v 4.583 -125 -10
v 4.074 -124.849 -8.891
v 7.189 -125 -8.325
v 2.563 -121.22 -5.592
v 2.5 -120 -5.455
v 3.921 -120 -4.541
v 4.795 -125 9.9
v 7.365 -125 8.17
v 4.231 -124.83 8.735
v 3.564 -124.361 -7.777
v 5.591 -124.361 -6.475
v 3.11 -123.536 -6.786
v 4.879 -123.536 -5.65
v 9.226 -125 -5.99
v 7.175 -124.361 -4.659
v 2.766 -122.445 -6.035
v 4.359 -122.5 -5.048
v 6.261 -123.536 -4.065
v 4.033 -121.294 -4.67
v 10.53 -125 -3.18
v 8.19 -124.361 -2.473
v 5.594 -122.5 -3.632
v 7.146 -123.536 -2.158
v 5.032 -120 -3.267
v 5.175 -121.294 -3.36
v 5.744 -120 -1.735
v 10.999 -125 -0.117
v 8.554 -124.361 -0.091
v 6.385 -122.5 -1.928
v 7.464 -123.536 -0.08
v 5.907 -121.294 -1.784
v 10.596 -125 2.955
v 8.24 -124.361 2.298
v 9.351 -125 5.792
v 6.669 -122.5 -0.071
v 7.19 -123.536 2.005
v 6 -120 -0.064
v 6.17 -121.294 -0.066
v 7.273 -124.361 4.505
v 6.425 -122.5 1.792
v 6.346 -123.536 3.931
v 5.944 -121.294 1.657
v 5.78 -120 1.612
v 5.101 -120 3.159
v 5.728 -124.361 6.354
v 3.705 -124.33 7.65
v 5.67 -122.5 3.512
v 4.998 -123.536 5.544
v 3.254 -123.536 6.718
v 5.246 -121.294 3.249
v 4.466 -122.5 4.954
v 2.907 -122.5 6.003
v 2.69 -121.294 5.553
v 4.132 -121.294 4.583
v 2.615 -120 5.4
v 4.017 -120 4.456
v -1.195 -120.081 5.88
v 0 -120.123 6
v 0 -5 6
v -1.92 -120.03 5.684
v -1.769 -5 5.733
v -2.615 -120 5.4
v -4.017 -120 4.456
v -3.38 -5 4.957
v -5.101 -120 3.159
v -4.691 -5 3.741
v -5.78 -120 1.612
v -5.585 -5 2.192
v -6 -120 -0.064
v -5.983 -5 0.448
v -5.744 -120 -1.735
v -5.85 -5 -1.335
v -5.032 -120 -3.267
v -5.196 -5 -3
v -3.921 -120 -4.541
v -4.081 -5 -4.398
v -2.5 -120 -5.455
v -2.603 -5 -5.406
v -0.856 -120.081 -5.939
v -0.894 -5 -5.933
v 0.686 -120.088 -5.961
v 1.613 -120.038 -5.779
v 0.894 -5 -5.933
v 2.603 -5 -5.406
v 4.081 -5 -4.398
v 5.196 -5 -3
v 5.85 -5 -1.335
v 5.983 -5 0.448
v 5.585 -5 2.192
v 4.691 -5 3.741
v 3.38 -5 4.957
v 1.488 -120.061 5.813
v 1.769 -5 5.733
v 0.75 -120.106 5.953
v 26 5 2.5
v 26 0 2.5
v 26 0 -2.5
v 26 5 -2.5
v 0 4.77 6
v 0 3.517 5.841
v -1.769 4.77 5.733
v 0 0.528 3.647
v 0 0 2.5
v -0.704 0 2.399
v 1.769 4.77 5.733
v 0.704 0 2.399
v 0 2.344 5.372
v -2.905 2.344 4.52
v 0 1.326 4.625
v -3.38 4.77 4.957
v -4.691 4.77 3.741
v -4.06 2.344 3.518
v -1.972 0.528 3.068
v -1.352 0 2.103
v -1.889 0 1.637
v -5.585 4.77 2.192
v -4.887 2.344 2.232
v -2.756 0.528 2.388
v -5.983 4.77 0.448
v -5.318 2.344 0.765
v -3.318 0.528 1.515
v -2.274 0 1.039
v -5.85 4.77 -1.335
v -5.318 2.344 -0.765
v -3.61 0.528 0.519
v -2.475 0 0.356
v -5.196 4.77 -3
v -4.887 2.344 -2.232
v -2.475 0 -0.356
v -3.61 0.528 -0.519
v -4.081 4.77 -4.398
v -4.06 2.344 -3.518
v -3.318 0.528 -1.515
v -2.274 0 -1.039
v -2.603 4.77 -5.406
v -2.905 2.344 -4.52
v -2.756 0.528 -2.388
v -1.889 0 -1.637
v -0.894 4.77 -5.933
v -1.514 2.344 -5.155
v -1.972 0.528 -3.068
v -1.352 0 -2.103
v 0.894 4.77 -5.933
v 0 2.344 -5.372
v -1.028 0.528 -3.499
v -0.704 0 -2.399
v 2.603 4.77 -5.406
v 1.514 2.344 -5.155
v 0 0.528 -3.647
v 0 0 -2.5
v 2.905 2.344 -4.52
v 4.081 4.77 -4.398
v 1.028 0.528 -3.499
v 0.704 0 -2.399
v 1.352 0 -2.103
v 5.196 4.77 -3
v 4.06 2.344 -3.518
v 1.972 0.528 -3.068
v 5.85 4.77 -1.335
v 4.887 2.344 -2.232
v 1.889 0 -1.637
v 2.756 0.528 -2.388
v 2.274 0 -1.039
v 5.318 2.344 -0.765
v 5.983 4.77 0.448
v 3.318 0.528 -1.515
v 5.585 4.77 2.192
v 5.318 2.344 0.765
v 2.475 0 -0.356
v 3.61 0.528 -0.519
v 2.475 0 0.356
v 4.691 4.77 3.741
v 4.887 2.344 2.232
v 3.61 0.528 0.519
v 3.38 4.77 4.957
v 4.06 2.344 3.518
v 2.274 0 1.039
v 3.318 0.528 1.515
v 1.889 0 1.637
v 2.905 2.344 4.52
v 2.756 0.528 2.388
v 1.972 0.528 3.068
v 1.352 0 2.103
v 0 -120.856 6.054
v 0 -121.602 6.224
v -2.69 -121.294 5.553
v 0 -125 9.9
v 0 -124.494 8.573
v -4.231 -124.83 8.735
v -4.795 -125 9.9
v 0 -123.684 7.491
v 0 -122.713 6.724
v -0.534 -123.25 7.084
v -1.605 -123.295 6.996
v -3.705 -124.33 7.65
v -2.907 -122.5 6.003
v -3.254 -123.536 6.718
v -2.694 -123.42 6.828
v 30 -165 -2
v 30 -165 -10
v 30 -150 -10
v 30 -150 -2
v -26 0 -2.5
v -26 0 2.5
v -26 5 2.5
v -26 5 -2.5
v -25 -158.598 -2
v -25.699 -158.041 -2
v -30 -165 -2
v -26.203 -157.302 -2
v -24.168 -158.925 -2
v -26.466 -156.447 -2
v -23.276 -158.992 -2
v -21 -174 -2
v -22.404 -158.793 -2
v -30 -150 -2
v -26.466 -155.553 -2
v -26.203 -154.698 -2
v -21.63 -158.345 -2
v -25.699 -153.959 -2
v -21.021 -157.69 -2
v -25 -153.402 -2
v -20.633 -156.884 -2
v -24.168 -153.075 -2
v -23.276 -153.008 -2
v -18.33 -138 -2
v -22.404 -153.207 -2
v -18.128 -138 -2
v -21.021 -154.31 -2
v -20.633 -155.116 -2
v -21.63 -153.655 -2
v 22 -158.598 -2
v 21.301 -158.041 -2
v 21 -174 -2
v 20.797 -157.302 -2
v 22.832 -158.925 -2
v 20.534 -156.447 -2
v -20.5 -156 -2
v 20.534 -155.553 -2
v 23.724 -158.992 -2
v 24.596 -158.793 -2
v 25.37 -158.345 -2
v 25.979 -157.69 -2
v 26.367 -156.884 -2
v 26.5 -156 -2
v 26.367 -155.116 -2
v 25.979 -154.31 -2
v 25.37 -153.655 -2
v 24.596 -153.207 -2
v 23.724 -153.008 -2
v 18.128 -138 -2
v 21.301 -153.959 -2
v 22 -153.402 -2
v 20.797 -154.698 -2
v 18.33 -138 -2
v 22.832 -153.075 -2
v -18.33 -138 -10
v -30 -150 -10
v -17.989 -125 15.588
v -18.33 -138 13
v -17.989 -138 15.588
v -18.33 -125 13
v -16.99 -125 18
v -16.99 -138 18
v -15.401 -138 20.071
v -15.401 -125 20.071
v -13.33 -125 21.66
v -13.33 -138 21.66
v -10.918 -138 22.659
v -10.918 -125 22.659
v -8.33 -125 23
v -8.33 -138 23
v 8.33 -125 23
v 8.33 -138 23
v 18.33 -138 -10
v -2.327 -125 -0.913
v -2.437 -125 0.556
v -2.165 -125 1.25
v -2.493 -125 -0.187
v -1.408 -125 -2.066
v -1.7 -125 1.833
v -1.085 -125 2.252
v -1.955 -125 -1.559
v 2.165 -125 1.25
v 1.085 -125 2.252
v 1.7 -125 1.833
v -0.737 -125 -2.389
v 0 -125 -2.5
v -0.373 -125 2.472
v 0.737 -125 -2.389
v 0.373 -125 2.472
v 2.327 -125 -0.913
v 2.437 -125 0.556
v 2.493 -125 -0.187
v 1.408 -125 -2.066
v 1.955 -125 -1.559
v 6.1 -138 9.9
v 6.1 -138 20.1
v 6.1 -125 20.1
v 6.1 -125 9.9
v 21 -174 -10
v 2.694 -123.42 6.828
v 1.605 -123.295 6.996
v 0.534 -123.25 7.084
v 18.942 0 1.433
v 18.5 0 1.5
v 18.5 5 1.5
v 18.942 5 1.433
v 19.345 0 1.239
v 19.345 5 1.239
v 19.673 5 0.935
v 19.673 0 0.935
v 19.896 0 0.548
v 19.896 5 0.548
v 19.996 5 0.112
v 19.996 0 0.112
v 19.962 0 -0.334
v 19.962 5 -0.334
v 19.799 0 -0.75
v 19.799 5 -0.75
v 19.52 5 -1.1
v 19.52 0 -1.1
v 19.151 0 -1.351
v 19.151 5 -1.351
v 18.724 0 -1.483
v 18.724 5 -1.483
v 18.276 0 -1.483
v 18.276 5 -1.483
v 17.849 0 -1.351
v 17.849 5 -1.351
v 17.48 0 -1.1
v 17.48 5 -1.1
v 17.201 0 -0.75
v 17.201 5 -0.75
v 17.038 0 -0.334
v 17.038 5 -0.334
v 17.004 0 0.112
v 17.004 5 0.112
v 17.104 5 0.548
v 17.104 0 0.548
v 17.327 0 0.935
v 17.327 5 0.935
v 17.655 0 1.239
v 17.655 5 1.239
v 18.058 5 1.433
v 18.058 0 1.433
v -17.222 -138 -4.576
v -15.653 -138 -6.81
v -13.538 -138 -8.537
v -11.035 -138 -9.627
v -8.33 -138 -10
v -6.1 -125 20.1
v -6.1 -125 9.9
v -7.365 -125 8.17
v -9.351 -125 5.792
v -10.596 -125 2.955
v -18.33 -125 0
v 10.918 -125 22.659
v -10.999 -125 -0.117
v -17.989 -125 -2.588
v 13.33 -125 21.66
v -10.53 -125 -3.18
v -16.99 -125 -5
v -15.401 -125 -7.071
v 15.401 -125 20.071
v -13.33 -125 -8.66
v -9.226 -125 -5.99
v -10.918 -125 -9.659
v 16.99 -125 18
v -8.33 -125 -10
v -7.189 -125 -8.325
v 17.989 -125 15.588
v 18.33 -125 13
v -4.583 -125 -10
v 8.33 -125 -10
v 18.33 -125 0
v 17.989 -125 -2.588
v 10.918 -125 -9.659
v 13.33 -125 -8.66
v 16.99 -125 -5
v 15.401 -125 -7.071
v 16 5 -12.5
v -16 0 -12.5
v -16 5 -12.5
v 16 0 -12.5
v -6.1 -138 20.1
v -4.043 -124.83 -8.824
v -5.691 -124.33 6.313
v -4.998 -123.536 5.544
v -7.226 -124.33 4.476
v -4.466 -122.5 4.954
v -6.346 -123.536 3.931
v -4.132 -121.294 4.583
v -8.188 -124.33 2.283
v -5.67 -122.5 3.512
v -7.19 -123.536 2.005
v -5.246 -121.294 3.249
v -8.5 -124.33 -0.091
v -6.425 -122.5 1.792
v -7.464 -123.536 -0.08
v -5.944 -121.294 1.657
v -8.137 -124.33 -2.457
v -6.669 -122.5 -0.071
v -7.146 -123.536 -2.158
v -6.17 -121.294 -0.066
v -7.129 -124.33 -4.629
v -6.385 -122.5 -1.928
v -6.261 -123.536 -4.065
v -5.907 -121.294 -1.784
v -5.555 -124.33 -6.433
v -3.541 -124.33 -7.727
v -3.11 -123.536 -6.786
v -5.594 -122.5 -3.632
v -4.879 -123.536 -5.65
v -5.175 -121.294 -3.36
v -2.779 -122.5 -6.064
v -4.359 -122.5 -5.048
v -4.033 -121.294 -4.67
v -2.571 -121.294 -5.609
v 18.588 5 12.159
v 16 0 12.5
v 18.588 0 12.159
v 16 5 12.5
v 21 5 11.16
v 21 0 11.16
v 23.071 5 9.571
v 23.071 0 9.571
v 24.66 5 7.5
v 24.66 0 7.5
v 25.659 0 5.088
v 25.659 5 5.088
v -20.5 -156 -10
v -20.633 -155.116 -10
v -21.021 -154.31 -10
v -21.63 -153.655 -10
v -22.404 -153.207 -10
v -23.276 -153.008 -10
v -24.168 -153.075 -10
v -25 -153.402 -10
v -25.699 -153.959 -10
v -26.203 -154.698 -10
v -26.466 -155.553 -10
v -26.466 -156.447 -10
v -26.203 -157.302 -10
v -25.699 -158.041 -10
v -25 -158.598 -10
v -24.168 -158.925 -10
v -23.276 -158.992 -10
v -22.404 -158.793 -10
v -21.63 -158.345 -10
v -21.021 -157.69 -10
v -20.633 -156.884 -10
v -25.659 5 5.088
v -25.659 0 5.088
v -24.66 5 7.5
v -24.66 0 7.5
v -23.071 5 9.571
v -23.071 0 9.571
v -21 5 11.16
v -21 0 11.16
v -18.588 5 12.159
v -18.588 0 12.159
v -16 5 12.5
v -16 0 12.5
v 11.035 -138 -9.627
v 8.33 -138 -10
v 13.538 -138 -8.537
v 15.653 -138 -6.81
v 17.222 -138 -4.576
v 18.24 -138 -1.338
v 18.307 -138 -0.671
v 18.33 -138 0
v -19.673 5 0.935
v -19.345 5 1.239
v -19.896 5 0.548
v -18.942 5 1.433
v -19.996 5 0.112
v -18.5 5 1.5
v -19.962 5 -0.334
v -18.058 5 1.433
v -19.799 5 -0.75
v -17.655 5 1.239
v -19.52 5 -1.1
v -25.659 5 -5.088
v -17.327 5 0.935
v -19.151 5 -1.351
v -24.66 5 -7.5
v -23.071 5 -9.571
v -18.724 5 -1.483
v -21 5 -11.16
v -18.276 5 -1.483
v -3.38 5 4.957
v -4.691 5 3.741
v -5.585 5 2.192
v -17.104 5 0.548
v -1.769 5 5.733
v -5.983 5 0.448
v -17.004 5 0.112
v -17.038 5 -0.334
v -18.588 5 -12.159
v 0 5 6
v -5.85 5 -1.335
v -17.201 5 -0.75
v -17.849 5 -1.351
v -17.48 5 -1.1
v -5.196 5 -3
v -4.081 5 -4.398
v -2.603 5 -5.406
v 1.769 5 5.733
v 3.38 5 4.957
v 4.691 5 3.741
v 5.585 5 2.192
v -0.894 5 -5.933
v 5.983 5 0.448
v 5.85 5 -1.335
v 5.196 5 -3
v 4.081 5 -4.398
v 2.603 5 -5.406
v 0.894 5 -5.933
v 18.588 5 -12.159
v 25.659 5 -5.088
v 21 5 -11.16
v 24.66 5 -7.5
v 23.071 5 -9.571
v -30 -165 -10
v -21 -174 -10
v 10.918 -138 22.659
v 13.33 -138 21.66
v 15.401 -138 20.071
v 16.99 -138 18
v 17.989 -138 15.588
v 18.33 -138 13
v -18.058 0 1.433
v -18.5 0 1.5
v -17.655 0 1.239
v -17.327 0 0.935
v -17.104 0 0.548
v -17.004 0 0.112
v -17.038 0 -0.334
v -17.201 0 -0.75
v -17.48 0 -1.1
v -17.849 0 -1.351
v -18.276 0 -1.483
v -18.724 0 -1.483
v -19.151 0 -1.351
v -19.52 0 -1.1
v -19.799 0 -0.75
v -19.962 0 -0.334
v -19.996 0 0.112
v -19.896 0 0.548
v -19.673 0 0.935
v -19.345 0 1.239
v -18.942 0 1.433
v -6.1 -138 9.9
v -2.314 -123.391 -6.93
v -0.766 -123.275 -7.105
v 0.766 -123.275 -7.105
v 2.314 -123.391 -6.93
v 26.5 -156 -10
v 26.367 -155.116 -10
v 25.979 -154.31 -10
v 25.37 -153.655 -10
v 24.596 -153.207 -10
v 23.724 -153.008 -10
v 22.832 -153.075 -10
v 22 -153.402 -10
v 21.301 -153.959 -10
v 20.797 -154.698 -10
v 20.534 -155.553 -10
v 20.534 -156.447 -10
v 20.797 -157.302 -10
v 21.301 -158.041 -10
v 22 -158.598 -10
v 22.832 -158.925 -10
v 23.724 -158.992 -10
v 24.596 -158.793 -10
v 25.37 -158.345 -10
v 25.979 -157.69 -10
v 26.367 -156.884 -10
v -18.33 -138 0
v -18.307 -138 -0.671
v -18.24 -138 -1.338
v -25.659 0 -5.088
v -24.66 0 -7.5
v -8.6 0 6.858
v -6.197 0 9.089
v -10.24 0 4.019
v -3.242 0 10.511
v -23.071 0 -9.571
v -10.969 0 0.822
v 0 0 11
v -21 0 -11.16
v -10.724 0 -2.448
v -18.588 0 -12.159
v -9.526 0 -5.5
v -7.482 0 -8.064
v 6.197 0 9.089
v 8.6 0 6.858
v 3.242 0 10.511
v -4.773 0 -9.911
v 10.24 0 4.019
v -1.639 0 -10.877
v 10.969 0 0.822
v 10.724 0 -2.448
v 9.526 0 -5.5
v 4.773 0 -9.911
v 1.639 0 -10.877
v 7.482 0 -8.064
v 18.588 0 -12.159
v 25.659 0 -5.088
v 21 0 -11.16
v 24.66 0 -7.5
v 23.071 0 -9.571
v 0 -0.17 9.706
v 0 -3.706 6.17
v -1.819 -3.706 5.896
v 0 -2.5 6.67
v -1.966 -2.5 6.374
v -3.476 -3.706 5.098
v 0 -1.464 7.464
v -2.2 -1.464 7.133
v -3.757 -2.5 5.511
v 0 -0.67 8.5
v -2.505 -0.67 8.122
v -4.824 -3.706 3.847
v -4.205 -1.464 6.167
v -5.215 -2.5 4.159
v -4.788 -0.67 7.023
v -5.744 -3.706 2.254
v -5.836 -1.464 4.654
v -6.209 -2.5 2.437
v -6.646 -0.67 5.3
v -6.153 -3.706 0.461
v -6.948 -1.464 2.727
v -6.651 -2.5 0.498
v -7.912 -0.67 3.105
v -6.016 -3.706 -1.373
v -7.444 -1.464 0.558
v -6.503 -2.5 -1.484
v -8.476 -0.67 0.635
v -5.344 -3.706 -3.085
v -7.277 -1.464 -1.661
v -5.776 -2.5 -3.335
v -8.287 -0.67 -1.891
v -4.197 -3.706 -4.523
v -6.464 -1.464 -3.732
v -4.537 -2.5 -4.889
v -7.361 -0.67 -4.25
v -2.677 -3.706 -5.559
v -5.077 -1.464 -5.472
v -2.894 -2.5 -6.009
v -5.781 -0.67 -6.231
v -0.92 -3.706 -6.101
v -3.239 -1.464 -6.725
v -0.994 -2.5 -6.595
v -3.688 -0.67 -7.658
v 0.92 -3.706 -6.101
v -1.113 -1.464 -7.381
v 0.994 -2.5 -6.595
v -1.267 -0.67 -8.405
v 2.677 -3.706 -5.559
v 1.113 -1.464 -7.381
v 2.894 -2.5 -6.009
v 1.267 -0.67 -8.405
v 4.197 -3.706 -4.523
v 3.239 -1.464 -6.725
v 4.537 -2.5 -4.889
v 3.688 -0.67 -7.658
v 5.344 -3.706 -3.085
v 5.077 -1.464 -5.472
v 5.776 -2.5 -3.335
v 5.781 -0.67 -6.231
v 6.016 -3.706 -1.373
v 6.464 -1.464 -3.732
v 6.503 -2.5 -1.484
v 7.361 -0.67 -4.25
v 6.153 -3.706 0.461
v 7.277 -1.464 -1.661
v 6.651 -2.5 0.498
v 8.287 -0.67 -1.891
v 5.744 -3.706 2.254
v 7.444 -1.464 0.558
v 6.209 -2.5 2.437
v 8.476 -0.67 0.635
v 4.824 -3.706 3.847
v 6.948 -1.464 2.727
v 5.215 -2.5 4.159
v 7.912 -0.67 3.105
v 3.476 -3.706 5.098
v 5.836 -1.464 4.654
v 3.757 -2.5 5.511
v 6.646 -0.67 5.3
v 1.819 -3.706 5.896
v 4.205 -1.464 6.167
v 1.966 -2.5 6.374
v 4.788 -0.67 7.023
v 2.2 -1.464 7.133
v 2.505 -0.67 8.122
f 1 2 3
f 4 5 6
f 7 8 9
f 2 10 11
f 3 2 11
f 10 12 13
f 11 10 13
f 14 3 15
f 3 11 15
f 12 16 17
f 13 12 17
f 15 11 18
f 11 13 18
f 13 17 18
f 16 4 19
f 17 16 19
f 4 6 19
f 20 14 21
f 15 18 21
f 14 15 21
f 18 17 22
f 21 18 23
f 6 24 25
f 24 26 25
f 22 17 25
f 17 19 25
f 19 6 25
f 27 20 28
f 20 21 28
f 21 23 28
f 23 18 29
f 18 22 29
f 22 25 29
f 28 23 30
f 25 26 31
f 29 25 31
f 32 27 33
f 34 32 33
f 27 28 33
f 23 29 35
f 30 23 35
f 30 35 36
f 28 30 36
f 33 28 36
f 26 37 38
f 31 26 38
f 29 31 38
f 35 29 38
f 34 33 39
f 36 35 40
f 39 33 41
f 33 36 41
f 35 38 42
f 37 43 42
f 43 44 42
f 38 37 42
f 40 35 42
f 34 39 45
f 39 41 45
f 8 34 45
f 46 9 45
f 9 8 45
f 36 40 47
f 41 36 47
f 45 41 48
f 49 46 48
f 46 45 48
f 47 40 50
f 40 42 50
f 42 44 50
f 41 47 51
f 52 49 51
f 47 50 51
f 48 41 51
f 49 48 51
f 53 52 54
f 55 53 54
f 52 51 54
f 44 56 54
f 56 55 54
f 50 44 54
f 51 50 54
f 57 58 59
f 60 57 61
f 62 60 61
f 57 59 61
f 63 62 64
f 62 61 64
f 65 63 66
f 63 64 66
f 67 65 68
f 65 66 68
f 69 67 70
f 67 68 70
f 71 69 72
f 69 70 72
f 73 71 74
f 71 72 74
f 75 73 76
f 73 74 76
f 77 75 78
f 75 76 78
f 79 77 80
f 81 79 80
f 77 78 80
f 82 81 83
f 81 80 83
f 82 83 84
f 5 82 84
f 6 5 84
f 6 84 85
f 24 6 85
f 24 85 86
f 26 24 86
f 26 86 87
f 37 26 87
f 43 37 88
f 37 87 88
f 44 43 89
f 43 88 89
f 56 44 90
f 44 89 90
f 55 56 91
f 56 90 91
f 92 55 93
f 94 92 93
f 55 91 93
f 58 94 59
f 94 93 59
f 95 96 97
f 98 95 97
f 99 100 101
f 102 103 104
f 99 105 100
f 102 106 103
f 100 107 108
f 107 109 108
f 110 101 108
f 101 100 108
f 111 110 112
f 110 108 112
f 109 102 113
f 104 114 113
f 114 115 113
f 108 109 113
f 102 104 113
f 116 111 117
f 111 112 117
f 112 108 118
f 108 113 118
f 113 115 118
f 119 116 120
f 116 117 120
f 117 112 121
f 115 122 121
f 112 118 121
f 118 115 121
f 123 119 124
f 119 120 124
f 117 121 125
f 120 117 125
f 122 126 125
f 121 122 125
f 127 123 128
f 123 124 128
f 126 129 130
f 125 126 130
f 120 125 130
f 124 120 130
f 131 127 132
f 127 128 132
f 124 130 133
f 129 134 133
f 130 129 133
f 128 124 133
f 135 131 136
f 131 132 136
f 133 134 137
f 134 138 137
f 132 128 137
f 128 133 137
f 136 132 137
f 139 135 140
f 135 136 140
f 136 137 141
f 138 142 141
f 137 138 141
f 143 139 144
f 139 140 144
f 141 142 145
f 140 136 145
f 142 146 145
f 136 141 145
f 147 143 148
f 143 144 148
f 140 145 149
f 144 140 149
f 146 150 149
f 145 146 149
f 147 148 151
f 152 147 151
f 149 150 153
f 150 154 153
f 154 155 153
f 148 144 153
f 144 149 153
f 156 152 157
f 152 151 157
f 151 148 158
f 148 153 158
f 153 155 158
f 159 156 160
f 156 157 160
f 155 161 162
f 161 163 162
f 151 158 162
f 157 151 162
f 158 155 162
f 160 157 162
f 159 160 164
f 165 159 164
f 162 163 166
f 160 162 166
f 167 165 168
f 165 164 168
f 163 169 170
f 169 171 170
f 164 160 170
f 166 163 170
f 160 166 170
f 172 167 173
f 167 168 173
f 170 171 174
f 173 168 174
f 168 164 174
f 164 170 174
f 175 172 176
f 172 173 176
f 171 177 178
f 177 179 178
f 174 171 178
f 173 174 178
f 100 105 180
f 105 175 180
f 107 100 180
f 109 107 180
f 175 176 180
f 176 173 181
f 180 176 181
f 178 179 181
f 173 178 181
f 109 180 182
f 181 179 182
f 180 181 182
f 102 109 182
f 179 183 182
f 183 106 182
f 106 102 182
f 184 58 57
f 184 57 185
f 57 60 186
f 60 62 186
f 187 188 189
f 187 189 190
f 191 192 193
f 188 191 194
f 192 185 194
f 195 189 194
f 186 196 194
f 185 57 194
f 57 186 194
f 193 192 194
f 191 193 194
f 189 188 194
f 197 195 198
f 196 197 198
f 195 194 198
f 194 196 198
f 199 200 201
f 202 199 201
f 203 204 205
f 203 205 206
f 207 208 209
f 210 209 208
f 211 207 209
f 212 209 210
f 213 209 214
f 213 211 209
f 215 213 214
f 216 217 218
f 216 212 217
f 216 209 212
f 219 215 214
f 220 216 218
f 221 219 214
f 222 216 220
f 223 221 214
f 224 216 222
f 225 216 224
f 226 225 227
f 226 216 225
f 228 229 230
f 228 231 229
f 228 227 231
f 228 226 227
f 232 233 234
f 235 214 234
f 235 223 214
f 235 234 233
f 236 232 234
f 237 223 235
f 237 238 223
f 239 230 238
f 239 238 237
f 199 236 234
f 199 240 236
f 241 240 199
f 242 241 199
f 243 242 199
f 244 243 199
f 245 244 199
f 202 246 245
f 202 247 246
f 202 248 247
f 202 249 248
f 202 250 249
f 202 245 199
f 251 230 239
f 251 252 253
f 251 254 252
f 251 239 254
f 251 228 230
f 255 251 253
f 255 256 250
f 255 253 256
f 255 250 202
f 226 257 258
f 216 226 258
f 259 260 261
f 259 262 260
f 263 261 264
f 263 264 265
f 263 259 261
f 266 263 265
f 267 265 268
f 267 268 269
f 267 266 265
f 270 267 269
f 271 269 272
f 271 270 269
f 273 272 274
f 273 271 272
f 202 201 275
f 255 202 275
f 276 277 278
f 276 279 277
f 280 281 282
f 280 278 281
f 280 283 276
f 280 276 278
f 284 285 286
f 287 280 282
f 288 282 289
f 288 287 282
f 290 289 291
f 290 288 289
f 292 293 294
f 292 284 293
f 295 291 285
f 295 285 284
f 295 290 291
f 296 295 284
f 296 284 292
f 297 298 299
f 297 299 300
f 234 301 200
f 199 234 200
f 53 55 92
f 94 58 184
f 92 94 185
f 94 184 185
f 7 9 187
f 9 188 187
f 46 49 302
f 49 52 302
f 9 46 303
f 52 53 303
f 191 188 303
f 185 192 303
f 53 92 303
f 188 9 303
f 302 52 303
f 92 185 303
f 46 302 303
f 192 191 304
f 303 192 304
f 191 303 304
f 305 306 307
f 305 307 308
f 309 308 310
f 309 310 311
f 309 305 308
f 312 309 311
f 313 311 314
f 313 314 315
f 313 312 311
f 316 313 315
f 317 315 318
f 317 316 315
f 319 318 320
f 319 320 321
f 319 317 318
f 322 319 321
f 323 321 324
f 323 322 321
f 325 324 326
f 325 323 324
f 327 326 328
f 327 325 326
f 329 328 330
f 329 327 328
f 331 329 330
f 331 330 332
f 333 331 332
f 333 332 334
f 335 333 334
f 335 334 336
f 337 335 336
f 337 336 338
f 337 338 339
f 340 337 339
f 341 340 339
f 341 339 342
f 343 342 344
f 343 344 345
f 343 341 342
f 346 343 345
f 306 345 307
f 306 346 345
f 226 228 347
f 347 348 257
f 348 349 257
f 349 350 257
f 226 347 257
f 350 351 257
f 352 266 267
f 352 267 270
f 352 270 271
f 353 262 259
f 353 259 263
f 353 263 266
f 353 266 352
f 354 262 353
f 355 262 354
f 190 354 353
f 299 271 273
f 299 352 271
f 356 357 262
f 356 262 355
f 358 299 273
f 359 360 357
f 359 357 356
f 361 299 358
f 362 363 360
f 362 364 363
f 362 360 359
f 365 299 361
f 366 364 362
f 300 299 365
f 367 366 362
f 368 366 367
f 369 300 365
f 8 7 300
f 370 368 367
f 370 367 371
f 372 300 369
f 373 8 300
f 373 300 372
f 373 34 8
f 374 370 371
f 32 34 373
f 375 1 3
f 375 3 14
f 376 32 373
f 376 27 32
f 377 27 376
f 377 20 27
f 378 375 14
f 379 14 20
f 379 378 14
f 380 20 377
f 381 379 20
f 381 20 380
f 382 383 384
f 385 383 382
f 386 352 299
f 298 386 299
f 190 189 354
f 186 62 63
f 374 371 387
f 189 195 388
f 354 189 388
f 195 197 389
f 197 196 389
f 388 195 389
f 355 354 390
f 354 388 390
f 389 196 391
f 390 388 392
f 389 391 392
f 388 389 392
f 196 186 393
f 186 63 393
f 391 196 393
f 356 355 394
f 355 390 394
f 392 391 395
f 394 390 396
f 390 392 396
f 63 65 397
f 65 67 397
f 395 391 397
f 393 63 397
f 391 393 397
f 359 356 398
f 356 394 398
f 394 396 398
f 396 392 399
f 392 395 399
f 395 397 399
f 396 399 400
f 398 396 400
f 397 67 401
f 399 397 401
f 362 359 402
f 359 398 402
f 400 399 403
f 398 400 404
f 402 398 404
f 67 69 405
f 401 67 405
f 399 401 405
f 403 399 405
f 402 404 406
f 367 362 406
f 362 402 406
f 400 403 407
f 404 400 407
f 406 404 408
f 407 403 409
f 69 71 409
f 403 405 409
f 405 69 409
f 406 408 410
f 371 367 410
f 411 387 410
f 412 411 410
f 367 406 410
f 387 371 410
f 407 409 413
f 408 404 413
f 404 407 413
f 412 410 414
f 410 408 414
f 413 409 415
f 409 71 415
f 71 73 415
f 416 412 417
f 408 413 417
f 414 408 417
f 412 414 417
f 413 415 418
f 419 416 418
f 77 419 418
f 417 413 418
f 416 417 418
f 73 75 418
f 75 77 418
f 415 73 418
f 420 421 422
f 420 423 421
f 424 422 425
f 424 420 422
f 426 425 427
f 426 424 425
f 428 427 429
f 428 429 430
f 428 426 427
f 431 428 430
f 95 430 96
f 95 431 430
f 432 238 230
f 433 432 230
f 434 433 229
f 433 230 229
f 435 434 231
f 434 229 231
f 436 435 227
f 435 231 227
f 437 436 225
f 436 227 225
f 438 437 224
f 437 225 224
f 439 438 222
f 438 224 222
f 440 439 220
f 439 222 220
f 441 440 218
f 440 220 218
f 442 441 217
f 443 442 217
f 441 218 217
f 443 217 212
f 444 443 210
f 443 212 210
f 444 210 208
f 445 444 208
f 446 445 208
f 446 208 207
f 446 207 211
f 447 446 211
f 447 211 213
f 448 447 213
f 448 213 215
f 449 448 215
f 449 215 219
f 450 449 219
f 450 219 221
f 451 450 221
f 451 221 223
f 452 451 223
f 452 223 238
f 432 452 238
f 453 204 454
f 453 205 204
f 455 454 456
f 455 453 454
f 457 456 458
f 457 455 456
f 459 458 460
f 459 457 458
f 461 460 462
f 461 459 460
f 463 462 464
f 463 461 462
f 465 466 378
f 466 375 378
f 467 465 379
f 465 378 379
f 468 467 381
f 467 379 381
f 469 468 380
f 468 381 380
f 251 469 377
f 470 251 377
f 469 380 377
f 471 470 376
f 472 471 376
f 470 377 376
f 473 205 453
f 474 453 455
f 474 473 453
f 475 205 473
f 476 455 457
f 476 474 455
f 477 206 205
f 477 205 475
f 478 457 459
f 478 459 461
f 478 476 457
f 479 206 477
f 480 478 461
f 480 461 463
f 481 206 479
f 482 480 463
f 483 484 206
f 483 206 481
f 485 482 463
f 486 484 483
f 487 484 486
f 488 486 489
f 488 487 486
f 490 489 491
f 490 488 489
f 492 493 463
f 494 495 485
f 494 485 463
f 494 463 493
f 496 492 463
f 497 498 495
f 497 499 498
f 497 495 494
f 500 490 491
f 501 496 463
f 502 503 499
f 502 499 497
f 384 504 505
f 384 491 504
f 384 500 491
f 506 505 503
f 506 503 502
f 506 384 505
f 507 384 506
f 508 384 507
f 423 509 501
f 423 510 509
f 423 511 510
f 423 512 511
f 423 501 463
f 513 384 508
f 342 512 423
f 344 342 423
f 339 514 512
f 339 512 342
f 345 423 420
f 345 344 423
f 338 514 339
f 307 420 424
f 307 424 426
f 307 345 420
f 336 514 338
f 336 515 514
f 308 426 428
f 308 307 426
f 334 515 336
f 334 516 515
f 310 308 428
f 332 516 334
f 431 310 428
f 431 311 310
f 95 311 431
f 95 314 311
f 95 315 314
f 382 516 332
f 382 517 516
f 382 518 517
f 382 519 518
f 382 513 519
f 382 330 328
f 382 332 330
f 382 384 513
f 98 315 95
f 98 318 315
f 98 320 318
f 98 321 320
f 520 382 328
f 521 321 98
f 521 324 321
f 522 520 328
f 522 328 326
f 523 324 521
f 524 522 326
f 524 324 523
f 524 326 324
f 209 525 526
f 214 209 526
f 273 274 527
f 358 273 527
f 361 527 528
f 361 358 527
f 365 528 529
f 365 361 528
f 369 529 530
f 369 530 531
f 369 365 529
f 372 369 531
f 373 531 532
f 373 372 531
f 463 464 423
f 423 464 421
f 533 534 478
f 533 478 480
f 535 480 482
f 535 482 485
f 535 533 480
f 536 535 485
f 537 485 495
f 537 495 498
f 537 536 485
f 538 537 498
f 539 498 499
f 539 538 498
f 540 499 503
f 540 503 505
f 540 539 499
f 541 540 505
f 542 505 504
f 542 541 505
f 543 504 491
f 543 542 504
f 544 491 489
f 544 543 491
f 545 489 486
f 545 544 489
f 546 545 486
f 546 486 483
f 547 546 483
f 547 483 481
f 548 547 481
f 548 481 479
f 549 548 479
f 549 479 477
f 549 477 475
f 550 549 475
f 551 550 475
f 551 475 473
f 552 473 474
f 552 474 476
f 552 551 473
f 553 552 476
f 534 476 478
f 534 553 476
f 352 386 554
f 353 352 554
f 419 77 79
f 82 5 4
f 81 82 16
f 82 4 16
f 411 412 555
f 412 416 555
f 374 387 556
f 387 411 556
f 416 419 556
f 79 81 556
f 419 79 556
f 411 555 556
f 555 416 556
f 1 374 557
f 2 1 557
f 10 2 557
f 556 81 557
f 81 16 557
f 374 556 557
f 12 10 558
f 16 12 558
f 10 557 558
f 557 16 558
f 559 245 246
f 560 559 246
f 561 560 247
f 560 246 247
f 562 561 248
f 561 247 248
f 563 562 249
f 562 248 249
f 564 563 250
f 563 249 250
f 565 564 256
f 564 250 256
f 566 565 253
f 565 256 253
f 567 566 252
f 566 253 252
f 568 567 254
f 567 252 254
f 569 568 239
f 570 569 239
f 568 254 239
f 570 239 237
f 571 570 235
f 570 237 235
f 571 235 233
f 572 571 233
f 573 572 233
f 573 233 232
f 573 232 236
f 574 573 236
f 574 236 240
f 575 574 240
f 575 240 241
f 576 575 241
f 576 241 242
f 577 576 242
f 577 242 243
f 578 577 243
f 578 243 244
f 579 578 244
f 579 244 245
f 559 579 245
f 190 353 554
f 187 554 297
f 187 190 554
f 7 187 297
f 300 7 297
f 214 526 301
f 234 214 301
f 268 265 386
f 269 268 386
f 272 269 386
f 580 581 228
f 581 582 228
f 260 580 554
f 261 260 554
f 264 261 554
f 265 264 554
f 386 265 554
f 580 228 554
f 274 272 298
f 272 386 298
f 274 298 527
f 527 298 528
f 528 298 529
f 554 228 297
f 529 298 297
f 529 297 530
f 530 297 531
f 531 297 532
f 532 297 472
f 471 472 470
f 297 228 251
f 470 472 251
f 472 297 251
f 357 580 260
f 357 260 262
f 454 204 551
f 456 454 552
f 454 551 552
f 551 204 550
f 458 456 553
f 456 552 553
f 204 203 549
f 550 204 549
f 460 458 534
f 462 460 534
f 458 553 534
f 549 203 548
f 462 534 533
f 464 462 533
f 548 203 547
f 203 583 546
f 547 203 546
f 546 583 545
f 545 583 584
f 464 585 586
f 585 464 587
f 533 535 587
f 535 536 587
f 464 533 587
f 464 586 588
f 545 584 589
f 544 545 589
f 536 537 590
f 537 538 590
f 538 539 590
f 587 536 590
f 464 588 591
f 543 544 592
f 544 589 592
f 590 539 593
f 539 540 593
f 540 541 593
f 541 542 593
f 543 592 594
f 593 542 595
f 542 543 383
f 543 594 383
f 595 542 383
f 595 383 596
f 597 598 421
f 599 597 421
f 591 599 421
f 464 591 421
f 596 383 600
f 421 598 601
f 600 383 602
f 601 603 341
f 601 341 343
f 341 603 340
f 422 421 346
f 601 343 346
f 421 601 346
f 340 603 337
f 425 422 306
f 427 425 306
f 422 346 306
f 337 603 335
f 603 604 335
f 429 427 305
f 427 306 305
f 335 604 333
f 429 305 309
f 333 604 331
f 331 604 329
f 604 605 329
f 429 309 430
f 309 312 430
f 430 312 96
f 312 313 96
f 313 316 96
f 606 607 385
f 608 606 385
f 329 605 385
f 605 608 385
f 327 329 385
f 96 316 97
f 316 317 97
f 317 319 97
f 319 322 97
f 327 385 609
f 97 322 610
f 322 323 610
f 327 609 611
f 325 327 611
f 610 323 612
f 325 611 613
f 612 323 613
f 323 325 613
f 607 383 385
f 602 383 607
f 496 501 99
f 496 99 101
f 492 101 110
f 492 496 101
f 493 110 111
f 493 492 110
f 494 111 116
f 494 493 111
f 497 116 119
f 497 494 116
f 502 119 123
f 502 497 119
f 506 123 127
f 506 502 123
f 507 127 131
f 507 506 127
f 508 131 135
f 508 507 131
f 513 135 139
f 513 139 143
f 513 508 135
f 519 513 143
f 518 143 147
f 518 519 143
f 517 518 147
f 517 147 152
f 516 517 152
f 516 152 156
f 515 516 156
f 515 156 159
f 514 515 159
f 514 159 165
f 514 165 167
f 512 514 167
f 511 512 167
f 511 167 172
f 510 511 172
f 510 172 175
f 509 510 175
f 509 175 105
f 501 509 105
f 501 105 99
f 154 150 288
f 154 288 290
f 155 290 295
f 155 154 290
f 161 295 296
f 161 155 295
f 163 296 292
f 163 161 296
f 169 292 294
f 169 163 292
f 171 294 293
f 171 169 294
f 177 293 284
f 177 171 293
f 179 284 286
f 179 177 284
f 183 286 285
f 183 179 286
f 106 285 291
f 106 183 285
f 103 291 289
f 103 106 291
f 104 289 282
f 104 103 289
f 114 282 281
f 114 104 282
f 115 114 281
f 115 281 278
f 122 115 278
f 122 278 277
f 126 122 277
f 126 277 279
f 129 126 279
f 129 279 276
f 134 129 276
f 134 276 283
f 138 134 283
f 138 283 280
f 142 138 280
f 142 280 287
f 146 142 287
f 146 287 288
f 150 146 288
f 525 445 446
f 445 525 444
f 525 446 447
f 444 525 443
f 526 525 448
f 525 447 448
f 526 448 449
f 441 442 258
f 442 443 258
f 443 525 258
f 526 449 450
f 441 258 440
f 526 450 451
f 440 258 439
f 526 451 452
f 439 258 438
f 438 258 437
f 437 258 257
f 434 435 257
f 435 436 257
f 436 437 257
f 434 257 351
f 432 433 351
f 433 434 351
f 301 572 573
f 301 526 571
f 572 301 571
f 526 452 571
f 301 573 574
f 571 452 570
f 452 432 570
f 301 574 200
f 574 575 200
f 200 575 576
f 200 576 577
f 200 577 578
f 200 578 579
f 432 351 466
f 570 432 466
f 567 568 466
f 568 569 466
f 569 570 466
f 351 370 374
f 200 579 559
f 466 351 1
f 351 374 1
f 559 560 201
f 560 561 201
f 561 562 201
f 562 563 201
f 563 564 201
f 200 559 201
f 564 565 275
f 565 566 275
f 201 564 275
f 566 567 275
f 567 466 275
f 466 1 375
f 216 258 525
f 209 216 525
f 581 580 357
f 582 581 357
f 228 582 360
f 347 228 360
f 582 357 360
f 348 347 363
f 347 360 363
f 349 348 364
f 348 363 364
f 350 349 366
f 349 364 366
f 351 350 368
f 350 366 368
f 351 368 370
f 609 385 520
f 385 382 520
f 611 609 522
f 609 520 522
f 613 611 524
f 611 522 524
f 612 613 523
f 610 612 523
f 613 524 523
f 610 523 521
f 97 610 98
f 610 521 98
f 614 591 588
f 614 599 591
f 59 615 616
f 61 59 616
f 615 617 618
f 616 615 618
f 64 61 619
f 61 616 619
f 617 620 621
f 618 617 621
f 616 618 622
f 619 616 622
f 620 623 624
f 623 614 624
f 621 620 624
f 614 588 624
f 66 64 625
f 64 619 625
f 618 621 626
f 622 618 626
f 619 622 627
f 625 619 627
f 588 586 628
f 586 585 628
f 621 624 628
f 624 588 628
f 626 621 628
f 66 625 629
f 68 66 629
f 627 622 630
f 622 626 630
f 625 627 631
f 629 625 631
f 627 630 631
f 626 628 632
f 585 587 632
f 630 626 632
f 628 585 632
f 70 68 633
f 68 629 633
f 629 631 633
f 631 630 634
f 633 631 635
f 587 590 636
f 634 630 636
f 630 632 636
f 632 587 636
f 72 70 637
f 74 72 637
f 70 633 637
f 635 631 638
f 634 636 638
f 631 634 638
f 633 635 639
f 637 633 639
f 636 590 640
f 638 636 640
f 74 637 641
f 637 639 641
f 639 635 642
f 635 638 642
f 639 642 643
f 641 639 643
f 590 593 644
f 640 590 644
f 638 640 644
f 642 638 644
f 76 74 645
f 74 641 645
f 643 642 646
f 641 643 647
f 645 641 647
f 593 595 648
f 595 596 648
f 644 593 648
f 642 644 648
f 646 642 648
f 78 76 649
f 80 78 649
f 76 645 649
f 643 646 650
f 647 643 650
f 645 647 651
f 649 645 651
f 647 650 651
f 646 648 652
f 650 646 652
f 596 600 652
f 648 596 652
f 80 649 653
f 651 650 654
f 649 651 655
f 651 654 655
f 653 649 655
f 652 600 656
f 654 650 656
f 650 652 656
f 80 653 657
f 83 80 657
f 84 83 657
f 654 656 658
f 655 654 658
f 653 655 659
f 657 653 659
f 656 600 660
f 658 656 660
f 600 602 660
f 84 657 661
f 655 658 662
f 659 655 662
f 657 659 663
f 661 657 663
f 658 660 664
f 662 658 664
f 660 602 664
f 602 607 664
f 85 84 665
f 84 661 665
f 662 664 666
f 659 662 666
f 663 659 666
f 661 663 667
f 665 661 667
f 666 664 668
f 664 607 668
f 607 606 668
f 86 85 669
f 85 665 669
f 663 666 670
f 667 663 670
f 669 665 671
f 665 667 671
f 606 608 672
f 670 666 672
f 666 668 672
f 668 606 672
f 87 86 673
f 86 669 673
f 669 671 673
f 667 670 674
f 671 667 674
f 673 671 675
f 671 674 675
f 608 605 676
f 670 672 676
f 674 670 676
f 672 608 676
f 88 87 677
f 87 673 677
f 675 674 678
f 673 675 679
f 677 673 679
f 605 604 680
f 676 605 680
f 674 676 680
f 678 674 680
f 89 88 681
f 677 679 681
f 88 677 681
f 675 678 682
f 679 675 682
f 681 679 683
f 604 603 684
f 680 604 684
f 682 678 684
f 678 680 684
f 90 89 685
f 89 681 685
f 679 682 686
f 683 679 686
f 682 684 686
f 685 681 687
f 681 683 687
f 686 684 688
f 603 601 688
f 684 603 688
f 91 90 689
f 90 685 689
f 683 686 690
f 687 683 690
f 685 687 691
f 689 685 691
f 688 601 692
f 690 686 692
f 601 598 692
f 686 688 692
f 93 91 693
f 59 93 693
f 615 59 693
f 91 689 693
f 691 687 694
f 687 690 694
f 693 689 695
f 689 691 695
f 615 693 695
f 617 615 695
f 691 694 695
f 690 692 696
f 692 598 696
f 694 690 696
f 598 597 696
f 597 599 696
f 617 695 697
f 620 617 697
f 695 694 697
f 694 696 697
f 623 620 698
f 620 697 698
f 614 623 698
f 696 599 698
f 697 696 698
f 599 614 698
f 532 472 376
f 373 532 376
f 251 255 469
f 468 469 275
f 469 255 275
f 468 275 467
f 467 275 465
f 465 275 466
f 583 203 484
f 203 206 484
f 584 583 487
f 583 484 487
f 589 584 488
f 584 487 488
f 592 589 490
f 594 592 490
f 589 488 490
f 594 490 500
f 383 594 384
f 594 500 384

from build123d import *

# Parameters (mm, degrees)
SKETCH_1_W           = 52
SKETCH_1_H           = 25
SKETCH_1_R           = 1.5
EXTRUDE_1_DEPTH      = 5
SKETCH_2_R           = 4
SKETCH_2_R_2         = 2.5
EXTRUDE_2_DEPTH      = 125
FILLET_1_R           = 10
SKETCH_2_3_R         = 6
SKETCH_2_3_R_2       = 4
EXTRUDE_4_DEPTH      = 125
FILLET_3_R           = 5
CUT_EXTRUDE_START    = -50
SKETCH_2_4_R         = 6
CUT_EXTRUDE_1_DEPTH  = 50
FILLET_4_R           = 5
EXTRUDE_5_DEPTH      = 23
EXTRUDE_5_DEPTH_BACK = 10
SKETCH_3_W           = 36.659715442
SKETCH_3_H           = 13
SKETCH_4_W           = 12.2
SKETCH_4_H           = 10.2
CUT_EXTRUDE_2_DEPTH  = 16
FILLET_5_R           = 10
EXTRUDE_6_DEPTH      = 8
FILLET_9_R           = 5
SKETCH_10_W          = 42
SKETCH_10_H          = 8
EXTRUDE_7_DEPTH      = 3
SKETCH_8_R           = 3
CUT_EXTRUDE_5_DEPTH  = 179.328348954


with BuildPart() as part:
    # 草图1 → 凸台-拉伸1 (new body)
    with BuildSketch(Plane(origin=(0, 0, 0), x_dir=(1, 0, 0), z_dir=(0, 1, 0))):
        Rectangle(SKETCH_1_W, SKETCH_1_H)
        with Locations(Location((-18.5, 0, 0), (0, 0, 270))):
            Circle(SKETCH_1_R, mode=Mode.SUBTRACT)
        with Locations(Location((18.5, 0, 0), (0, 0, 270))):
            Circle(SKETCH_1_R, mode=Mode.SUBTRACT)
    extrude(amount=EXTRUDE_1_DEPTH)

    # 草图2 → 凸台-拉伸2 (add)
    with BuildSketch(Plane.XZ):
        with Locations(Location((0, 0, 0), (0, 0, 90))):
            Circle(SKETCH_2_R)
        with Locations(Location((0, 0, 0), (0, 0, 270))):
            Circle(SKETCH_2_R_2, mode=Mode.SUBTRACT)
    extrude(amount=EXTRUDE_2_DEPTH)

    # 圆角1
    fillet_1_edges = [part.edges().sort_by_distance(p)[0] for p in [
        (26, 2.5, 12.5),
        (-26, 2.5, 12.5),
        (-26, 2.5, -12.5),
        (26, 2.5, -12.5),
    ]]
    fillet(fillet_1_edges, radius=FILLET_1_R)

    # 草图2<3> → 凸台-拉伸4 (add)
    with BuildSketch(Plane.XZ):
        with Locations(Location((0, 0, 0), (0, 0, 90))):
            Circle(SKETCH_2_3_R)
        Circle(SKETCH_2_3_R_2, mode=Mode.SUBTRACT)
    extrude(amount=EXTRUDE_4_DEPTH)

    # 圆角3
    fillet_3_edges = [part.edges().sort_by_distance(p)[0] for p in [
        (0, 0, -6),
    ]]
    fillet(fillet_3_edges, radius=FILLET_3_R)

    # 草图2<4> → 切除-拉伸1 (cut)
    with BuildSketch(Plane.XZ.offset(CUT_EXTRUDE_START)):
        with Locations(Location((0, 0, 0), (0, 0, 90))):
            Circle(SKETCH_2_4_R)
    extrude(amount=CUT_EXTRUDE_1_DEPTH, mode=Mode.SUBTRACT)

    # 圆角4
    # the kernel refuses this fillet: 5 mm, written as the material it adds along each edge
    with BuildSketch(Plane(origin=(0, 0, 0), x_dir=(0, 0, 1), z_dir=(1, 0, 0))) as fillet_4_piece_1:
        with BuildLine():
            CenterArc((1, -4.769696007), FILLET_4_R, 0, 72.542396876)
            Line((2.5, 0), (2.53, 0.09539392))
            ThreePointArc((2.53, 0.09539392), (4.25, 0.1), (6, 0.1))
            Line((6, 0.1), (6.1, 0))
            Line((6.1, 0), (6.1, -4.769696007))
            Line((6.1, -4.769696007), (6, -4.769696007))
        make_face()
    revolve(axis=Axis((0, 0, 0), (0, -1, 0)))

    # 草图3 → 凸台-拉伸5 (add, two sides: drawn at the far end of the back side and taken through both)
    with BuildSketch(Plane.XY.offset(-EXTRUDE_5_DEPTH_BACK)):
        with Locations((0, -131.5)):
            Rectangle(SKETCH_3_W, SKETCH_3_H)
    extrude(amount=EXTRUDE_5_DEPTH + EXTRUDE_5_DEPTH_BACK)

    # 草图4 → 切除-拉伸2 (cut)
    with BuildSketch(Plane(origin=(0, -125, 0), x_dir=(1, 0, 0), z_dir=(0, 1, 0))):
        with Locations((0, -15)):
            Rectangle(SKETCH_4_W, SKETCH_4_H)
    extrude(amount=-CUT_EXTRUDE_2_DEPTH, mode=Mode.SUBTRACT)

    # 圆角5
    fillet_5_edges = [part.edges().sort_by_distance(p)[0] for p in [
        (18.329857721, -131.5, -10),
        (-18.329857721, -131.5, -10),
        (18.329857721, -131.5, 23),
        (-18.329857721, -131.5, 23),
    ]]
    fillet(fillet_5_edges, radius=FILLET_5_R)

    # 草图5 → 凸台-拉伸6 (add)
    with BuildSketch(Plane.XY.offset(-10)):
        Polygon((-18.329857721, -138), (-30, -150), (-30, -165), (-21, -174), (0, -174), (21, -174), (30, -165), (30, -150), (18.329857721, -138), align=None)
    extrude(amount=EXTRUDE_6_DEPTH)

    # 圆角9
    fillet_9_edges = [part.edges().sort_by_distance(p)[0] for p in [
        (0, -125, -6),
    ]]
    fillet(fillet_9_edges, radius=FILLET_9_R)

    # 草图10 → 凸台-拉伸7 (add)
    with BuildSketch(Plane.XZ.offset(174)):
        with Locations((0, -6)):
            Rectangle(SKETCH_10_W, SKETCH_10_H)
    extrude(amount=-EXTRUDE_7_DEPTH)

    # 草图8 → 切除-拉伸5 (cut, through all)
    with BuildSketch(Plane.XY.offset(-2)):
        with Locations((23.5, -156)):
            Circle(SKETCH_8_R)
        with Locations((-23.5, -156)):
            Circle(SKETCH_8_R)
    extrude(amount=-CUT_EXTRUDE_5_DEPTH, mode=Mode.SUBTRACT)


solid = part.part
